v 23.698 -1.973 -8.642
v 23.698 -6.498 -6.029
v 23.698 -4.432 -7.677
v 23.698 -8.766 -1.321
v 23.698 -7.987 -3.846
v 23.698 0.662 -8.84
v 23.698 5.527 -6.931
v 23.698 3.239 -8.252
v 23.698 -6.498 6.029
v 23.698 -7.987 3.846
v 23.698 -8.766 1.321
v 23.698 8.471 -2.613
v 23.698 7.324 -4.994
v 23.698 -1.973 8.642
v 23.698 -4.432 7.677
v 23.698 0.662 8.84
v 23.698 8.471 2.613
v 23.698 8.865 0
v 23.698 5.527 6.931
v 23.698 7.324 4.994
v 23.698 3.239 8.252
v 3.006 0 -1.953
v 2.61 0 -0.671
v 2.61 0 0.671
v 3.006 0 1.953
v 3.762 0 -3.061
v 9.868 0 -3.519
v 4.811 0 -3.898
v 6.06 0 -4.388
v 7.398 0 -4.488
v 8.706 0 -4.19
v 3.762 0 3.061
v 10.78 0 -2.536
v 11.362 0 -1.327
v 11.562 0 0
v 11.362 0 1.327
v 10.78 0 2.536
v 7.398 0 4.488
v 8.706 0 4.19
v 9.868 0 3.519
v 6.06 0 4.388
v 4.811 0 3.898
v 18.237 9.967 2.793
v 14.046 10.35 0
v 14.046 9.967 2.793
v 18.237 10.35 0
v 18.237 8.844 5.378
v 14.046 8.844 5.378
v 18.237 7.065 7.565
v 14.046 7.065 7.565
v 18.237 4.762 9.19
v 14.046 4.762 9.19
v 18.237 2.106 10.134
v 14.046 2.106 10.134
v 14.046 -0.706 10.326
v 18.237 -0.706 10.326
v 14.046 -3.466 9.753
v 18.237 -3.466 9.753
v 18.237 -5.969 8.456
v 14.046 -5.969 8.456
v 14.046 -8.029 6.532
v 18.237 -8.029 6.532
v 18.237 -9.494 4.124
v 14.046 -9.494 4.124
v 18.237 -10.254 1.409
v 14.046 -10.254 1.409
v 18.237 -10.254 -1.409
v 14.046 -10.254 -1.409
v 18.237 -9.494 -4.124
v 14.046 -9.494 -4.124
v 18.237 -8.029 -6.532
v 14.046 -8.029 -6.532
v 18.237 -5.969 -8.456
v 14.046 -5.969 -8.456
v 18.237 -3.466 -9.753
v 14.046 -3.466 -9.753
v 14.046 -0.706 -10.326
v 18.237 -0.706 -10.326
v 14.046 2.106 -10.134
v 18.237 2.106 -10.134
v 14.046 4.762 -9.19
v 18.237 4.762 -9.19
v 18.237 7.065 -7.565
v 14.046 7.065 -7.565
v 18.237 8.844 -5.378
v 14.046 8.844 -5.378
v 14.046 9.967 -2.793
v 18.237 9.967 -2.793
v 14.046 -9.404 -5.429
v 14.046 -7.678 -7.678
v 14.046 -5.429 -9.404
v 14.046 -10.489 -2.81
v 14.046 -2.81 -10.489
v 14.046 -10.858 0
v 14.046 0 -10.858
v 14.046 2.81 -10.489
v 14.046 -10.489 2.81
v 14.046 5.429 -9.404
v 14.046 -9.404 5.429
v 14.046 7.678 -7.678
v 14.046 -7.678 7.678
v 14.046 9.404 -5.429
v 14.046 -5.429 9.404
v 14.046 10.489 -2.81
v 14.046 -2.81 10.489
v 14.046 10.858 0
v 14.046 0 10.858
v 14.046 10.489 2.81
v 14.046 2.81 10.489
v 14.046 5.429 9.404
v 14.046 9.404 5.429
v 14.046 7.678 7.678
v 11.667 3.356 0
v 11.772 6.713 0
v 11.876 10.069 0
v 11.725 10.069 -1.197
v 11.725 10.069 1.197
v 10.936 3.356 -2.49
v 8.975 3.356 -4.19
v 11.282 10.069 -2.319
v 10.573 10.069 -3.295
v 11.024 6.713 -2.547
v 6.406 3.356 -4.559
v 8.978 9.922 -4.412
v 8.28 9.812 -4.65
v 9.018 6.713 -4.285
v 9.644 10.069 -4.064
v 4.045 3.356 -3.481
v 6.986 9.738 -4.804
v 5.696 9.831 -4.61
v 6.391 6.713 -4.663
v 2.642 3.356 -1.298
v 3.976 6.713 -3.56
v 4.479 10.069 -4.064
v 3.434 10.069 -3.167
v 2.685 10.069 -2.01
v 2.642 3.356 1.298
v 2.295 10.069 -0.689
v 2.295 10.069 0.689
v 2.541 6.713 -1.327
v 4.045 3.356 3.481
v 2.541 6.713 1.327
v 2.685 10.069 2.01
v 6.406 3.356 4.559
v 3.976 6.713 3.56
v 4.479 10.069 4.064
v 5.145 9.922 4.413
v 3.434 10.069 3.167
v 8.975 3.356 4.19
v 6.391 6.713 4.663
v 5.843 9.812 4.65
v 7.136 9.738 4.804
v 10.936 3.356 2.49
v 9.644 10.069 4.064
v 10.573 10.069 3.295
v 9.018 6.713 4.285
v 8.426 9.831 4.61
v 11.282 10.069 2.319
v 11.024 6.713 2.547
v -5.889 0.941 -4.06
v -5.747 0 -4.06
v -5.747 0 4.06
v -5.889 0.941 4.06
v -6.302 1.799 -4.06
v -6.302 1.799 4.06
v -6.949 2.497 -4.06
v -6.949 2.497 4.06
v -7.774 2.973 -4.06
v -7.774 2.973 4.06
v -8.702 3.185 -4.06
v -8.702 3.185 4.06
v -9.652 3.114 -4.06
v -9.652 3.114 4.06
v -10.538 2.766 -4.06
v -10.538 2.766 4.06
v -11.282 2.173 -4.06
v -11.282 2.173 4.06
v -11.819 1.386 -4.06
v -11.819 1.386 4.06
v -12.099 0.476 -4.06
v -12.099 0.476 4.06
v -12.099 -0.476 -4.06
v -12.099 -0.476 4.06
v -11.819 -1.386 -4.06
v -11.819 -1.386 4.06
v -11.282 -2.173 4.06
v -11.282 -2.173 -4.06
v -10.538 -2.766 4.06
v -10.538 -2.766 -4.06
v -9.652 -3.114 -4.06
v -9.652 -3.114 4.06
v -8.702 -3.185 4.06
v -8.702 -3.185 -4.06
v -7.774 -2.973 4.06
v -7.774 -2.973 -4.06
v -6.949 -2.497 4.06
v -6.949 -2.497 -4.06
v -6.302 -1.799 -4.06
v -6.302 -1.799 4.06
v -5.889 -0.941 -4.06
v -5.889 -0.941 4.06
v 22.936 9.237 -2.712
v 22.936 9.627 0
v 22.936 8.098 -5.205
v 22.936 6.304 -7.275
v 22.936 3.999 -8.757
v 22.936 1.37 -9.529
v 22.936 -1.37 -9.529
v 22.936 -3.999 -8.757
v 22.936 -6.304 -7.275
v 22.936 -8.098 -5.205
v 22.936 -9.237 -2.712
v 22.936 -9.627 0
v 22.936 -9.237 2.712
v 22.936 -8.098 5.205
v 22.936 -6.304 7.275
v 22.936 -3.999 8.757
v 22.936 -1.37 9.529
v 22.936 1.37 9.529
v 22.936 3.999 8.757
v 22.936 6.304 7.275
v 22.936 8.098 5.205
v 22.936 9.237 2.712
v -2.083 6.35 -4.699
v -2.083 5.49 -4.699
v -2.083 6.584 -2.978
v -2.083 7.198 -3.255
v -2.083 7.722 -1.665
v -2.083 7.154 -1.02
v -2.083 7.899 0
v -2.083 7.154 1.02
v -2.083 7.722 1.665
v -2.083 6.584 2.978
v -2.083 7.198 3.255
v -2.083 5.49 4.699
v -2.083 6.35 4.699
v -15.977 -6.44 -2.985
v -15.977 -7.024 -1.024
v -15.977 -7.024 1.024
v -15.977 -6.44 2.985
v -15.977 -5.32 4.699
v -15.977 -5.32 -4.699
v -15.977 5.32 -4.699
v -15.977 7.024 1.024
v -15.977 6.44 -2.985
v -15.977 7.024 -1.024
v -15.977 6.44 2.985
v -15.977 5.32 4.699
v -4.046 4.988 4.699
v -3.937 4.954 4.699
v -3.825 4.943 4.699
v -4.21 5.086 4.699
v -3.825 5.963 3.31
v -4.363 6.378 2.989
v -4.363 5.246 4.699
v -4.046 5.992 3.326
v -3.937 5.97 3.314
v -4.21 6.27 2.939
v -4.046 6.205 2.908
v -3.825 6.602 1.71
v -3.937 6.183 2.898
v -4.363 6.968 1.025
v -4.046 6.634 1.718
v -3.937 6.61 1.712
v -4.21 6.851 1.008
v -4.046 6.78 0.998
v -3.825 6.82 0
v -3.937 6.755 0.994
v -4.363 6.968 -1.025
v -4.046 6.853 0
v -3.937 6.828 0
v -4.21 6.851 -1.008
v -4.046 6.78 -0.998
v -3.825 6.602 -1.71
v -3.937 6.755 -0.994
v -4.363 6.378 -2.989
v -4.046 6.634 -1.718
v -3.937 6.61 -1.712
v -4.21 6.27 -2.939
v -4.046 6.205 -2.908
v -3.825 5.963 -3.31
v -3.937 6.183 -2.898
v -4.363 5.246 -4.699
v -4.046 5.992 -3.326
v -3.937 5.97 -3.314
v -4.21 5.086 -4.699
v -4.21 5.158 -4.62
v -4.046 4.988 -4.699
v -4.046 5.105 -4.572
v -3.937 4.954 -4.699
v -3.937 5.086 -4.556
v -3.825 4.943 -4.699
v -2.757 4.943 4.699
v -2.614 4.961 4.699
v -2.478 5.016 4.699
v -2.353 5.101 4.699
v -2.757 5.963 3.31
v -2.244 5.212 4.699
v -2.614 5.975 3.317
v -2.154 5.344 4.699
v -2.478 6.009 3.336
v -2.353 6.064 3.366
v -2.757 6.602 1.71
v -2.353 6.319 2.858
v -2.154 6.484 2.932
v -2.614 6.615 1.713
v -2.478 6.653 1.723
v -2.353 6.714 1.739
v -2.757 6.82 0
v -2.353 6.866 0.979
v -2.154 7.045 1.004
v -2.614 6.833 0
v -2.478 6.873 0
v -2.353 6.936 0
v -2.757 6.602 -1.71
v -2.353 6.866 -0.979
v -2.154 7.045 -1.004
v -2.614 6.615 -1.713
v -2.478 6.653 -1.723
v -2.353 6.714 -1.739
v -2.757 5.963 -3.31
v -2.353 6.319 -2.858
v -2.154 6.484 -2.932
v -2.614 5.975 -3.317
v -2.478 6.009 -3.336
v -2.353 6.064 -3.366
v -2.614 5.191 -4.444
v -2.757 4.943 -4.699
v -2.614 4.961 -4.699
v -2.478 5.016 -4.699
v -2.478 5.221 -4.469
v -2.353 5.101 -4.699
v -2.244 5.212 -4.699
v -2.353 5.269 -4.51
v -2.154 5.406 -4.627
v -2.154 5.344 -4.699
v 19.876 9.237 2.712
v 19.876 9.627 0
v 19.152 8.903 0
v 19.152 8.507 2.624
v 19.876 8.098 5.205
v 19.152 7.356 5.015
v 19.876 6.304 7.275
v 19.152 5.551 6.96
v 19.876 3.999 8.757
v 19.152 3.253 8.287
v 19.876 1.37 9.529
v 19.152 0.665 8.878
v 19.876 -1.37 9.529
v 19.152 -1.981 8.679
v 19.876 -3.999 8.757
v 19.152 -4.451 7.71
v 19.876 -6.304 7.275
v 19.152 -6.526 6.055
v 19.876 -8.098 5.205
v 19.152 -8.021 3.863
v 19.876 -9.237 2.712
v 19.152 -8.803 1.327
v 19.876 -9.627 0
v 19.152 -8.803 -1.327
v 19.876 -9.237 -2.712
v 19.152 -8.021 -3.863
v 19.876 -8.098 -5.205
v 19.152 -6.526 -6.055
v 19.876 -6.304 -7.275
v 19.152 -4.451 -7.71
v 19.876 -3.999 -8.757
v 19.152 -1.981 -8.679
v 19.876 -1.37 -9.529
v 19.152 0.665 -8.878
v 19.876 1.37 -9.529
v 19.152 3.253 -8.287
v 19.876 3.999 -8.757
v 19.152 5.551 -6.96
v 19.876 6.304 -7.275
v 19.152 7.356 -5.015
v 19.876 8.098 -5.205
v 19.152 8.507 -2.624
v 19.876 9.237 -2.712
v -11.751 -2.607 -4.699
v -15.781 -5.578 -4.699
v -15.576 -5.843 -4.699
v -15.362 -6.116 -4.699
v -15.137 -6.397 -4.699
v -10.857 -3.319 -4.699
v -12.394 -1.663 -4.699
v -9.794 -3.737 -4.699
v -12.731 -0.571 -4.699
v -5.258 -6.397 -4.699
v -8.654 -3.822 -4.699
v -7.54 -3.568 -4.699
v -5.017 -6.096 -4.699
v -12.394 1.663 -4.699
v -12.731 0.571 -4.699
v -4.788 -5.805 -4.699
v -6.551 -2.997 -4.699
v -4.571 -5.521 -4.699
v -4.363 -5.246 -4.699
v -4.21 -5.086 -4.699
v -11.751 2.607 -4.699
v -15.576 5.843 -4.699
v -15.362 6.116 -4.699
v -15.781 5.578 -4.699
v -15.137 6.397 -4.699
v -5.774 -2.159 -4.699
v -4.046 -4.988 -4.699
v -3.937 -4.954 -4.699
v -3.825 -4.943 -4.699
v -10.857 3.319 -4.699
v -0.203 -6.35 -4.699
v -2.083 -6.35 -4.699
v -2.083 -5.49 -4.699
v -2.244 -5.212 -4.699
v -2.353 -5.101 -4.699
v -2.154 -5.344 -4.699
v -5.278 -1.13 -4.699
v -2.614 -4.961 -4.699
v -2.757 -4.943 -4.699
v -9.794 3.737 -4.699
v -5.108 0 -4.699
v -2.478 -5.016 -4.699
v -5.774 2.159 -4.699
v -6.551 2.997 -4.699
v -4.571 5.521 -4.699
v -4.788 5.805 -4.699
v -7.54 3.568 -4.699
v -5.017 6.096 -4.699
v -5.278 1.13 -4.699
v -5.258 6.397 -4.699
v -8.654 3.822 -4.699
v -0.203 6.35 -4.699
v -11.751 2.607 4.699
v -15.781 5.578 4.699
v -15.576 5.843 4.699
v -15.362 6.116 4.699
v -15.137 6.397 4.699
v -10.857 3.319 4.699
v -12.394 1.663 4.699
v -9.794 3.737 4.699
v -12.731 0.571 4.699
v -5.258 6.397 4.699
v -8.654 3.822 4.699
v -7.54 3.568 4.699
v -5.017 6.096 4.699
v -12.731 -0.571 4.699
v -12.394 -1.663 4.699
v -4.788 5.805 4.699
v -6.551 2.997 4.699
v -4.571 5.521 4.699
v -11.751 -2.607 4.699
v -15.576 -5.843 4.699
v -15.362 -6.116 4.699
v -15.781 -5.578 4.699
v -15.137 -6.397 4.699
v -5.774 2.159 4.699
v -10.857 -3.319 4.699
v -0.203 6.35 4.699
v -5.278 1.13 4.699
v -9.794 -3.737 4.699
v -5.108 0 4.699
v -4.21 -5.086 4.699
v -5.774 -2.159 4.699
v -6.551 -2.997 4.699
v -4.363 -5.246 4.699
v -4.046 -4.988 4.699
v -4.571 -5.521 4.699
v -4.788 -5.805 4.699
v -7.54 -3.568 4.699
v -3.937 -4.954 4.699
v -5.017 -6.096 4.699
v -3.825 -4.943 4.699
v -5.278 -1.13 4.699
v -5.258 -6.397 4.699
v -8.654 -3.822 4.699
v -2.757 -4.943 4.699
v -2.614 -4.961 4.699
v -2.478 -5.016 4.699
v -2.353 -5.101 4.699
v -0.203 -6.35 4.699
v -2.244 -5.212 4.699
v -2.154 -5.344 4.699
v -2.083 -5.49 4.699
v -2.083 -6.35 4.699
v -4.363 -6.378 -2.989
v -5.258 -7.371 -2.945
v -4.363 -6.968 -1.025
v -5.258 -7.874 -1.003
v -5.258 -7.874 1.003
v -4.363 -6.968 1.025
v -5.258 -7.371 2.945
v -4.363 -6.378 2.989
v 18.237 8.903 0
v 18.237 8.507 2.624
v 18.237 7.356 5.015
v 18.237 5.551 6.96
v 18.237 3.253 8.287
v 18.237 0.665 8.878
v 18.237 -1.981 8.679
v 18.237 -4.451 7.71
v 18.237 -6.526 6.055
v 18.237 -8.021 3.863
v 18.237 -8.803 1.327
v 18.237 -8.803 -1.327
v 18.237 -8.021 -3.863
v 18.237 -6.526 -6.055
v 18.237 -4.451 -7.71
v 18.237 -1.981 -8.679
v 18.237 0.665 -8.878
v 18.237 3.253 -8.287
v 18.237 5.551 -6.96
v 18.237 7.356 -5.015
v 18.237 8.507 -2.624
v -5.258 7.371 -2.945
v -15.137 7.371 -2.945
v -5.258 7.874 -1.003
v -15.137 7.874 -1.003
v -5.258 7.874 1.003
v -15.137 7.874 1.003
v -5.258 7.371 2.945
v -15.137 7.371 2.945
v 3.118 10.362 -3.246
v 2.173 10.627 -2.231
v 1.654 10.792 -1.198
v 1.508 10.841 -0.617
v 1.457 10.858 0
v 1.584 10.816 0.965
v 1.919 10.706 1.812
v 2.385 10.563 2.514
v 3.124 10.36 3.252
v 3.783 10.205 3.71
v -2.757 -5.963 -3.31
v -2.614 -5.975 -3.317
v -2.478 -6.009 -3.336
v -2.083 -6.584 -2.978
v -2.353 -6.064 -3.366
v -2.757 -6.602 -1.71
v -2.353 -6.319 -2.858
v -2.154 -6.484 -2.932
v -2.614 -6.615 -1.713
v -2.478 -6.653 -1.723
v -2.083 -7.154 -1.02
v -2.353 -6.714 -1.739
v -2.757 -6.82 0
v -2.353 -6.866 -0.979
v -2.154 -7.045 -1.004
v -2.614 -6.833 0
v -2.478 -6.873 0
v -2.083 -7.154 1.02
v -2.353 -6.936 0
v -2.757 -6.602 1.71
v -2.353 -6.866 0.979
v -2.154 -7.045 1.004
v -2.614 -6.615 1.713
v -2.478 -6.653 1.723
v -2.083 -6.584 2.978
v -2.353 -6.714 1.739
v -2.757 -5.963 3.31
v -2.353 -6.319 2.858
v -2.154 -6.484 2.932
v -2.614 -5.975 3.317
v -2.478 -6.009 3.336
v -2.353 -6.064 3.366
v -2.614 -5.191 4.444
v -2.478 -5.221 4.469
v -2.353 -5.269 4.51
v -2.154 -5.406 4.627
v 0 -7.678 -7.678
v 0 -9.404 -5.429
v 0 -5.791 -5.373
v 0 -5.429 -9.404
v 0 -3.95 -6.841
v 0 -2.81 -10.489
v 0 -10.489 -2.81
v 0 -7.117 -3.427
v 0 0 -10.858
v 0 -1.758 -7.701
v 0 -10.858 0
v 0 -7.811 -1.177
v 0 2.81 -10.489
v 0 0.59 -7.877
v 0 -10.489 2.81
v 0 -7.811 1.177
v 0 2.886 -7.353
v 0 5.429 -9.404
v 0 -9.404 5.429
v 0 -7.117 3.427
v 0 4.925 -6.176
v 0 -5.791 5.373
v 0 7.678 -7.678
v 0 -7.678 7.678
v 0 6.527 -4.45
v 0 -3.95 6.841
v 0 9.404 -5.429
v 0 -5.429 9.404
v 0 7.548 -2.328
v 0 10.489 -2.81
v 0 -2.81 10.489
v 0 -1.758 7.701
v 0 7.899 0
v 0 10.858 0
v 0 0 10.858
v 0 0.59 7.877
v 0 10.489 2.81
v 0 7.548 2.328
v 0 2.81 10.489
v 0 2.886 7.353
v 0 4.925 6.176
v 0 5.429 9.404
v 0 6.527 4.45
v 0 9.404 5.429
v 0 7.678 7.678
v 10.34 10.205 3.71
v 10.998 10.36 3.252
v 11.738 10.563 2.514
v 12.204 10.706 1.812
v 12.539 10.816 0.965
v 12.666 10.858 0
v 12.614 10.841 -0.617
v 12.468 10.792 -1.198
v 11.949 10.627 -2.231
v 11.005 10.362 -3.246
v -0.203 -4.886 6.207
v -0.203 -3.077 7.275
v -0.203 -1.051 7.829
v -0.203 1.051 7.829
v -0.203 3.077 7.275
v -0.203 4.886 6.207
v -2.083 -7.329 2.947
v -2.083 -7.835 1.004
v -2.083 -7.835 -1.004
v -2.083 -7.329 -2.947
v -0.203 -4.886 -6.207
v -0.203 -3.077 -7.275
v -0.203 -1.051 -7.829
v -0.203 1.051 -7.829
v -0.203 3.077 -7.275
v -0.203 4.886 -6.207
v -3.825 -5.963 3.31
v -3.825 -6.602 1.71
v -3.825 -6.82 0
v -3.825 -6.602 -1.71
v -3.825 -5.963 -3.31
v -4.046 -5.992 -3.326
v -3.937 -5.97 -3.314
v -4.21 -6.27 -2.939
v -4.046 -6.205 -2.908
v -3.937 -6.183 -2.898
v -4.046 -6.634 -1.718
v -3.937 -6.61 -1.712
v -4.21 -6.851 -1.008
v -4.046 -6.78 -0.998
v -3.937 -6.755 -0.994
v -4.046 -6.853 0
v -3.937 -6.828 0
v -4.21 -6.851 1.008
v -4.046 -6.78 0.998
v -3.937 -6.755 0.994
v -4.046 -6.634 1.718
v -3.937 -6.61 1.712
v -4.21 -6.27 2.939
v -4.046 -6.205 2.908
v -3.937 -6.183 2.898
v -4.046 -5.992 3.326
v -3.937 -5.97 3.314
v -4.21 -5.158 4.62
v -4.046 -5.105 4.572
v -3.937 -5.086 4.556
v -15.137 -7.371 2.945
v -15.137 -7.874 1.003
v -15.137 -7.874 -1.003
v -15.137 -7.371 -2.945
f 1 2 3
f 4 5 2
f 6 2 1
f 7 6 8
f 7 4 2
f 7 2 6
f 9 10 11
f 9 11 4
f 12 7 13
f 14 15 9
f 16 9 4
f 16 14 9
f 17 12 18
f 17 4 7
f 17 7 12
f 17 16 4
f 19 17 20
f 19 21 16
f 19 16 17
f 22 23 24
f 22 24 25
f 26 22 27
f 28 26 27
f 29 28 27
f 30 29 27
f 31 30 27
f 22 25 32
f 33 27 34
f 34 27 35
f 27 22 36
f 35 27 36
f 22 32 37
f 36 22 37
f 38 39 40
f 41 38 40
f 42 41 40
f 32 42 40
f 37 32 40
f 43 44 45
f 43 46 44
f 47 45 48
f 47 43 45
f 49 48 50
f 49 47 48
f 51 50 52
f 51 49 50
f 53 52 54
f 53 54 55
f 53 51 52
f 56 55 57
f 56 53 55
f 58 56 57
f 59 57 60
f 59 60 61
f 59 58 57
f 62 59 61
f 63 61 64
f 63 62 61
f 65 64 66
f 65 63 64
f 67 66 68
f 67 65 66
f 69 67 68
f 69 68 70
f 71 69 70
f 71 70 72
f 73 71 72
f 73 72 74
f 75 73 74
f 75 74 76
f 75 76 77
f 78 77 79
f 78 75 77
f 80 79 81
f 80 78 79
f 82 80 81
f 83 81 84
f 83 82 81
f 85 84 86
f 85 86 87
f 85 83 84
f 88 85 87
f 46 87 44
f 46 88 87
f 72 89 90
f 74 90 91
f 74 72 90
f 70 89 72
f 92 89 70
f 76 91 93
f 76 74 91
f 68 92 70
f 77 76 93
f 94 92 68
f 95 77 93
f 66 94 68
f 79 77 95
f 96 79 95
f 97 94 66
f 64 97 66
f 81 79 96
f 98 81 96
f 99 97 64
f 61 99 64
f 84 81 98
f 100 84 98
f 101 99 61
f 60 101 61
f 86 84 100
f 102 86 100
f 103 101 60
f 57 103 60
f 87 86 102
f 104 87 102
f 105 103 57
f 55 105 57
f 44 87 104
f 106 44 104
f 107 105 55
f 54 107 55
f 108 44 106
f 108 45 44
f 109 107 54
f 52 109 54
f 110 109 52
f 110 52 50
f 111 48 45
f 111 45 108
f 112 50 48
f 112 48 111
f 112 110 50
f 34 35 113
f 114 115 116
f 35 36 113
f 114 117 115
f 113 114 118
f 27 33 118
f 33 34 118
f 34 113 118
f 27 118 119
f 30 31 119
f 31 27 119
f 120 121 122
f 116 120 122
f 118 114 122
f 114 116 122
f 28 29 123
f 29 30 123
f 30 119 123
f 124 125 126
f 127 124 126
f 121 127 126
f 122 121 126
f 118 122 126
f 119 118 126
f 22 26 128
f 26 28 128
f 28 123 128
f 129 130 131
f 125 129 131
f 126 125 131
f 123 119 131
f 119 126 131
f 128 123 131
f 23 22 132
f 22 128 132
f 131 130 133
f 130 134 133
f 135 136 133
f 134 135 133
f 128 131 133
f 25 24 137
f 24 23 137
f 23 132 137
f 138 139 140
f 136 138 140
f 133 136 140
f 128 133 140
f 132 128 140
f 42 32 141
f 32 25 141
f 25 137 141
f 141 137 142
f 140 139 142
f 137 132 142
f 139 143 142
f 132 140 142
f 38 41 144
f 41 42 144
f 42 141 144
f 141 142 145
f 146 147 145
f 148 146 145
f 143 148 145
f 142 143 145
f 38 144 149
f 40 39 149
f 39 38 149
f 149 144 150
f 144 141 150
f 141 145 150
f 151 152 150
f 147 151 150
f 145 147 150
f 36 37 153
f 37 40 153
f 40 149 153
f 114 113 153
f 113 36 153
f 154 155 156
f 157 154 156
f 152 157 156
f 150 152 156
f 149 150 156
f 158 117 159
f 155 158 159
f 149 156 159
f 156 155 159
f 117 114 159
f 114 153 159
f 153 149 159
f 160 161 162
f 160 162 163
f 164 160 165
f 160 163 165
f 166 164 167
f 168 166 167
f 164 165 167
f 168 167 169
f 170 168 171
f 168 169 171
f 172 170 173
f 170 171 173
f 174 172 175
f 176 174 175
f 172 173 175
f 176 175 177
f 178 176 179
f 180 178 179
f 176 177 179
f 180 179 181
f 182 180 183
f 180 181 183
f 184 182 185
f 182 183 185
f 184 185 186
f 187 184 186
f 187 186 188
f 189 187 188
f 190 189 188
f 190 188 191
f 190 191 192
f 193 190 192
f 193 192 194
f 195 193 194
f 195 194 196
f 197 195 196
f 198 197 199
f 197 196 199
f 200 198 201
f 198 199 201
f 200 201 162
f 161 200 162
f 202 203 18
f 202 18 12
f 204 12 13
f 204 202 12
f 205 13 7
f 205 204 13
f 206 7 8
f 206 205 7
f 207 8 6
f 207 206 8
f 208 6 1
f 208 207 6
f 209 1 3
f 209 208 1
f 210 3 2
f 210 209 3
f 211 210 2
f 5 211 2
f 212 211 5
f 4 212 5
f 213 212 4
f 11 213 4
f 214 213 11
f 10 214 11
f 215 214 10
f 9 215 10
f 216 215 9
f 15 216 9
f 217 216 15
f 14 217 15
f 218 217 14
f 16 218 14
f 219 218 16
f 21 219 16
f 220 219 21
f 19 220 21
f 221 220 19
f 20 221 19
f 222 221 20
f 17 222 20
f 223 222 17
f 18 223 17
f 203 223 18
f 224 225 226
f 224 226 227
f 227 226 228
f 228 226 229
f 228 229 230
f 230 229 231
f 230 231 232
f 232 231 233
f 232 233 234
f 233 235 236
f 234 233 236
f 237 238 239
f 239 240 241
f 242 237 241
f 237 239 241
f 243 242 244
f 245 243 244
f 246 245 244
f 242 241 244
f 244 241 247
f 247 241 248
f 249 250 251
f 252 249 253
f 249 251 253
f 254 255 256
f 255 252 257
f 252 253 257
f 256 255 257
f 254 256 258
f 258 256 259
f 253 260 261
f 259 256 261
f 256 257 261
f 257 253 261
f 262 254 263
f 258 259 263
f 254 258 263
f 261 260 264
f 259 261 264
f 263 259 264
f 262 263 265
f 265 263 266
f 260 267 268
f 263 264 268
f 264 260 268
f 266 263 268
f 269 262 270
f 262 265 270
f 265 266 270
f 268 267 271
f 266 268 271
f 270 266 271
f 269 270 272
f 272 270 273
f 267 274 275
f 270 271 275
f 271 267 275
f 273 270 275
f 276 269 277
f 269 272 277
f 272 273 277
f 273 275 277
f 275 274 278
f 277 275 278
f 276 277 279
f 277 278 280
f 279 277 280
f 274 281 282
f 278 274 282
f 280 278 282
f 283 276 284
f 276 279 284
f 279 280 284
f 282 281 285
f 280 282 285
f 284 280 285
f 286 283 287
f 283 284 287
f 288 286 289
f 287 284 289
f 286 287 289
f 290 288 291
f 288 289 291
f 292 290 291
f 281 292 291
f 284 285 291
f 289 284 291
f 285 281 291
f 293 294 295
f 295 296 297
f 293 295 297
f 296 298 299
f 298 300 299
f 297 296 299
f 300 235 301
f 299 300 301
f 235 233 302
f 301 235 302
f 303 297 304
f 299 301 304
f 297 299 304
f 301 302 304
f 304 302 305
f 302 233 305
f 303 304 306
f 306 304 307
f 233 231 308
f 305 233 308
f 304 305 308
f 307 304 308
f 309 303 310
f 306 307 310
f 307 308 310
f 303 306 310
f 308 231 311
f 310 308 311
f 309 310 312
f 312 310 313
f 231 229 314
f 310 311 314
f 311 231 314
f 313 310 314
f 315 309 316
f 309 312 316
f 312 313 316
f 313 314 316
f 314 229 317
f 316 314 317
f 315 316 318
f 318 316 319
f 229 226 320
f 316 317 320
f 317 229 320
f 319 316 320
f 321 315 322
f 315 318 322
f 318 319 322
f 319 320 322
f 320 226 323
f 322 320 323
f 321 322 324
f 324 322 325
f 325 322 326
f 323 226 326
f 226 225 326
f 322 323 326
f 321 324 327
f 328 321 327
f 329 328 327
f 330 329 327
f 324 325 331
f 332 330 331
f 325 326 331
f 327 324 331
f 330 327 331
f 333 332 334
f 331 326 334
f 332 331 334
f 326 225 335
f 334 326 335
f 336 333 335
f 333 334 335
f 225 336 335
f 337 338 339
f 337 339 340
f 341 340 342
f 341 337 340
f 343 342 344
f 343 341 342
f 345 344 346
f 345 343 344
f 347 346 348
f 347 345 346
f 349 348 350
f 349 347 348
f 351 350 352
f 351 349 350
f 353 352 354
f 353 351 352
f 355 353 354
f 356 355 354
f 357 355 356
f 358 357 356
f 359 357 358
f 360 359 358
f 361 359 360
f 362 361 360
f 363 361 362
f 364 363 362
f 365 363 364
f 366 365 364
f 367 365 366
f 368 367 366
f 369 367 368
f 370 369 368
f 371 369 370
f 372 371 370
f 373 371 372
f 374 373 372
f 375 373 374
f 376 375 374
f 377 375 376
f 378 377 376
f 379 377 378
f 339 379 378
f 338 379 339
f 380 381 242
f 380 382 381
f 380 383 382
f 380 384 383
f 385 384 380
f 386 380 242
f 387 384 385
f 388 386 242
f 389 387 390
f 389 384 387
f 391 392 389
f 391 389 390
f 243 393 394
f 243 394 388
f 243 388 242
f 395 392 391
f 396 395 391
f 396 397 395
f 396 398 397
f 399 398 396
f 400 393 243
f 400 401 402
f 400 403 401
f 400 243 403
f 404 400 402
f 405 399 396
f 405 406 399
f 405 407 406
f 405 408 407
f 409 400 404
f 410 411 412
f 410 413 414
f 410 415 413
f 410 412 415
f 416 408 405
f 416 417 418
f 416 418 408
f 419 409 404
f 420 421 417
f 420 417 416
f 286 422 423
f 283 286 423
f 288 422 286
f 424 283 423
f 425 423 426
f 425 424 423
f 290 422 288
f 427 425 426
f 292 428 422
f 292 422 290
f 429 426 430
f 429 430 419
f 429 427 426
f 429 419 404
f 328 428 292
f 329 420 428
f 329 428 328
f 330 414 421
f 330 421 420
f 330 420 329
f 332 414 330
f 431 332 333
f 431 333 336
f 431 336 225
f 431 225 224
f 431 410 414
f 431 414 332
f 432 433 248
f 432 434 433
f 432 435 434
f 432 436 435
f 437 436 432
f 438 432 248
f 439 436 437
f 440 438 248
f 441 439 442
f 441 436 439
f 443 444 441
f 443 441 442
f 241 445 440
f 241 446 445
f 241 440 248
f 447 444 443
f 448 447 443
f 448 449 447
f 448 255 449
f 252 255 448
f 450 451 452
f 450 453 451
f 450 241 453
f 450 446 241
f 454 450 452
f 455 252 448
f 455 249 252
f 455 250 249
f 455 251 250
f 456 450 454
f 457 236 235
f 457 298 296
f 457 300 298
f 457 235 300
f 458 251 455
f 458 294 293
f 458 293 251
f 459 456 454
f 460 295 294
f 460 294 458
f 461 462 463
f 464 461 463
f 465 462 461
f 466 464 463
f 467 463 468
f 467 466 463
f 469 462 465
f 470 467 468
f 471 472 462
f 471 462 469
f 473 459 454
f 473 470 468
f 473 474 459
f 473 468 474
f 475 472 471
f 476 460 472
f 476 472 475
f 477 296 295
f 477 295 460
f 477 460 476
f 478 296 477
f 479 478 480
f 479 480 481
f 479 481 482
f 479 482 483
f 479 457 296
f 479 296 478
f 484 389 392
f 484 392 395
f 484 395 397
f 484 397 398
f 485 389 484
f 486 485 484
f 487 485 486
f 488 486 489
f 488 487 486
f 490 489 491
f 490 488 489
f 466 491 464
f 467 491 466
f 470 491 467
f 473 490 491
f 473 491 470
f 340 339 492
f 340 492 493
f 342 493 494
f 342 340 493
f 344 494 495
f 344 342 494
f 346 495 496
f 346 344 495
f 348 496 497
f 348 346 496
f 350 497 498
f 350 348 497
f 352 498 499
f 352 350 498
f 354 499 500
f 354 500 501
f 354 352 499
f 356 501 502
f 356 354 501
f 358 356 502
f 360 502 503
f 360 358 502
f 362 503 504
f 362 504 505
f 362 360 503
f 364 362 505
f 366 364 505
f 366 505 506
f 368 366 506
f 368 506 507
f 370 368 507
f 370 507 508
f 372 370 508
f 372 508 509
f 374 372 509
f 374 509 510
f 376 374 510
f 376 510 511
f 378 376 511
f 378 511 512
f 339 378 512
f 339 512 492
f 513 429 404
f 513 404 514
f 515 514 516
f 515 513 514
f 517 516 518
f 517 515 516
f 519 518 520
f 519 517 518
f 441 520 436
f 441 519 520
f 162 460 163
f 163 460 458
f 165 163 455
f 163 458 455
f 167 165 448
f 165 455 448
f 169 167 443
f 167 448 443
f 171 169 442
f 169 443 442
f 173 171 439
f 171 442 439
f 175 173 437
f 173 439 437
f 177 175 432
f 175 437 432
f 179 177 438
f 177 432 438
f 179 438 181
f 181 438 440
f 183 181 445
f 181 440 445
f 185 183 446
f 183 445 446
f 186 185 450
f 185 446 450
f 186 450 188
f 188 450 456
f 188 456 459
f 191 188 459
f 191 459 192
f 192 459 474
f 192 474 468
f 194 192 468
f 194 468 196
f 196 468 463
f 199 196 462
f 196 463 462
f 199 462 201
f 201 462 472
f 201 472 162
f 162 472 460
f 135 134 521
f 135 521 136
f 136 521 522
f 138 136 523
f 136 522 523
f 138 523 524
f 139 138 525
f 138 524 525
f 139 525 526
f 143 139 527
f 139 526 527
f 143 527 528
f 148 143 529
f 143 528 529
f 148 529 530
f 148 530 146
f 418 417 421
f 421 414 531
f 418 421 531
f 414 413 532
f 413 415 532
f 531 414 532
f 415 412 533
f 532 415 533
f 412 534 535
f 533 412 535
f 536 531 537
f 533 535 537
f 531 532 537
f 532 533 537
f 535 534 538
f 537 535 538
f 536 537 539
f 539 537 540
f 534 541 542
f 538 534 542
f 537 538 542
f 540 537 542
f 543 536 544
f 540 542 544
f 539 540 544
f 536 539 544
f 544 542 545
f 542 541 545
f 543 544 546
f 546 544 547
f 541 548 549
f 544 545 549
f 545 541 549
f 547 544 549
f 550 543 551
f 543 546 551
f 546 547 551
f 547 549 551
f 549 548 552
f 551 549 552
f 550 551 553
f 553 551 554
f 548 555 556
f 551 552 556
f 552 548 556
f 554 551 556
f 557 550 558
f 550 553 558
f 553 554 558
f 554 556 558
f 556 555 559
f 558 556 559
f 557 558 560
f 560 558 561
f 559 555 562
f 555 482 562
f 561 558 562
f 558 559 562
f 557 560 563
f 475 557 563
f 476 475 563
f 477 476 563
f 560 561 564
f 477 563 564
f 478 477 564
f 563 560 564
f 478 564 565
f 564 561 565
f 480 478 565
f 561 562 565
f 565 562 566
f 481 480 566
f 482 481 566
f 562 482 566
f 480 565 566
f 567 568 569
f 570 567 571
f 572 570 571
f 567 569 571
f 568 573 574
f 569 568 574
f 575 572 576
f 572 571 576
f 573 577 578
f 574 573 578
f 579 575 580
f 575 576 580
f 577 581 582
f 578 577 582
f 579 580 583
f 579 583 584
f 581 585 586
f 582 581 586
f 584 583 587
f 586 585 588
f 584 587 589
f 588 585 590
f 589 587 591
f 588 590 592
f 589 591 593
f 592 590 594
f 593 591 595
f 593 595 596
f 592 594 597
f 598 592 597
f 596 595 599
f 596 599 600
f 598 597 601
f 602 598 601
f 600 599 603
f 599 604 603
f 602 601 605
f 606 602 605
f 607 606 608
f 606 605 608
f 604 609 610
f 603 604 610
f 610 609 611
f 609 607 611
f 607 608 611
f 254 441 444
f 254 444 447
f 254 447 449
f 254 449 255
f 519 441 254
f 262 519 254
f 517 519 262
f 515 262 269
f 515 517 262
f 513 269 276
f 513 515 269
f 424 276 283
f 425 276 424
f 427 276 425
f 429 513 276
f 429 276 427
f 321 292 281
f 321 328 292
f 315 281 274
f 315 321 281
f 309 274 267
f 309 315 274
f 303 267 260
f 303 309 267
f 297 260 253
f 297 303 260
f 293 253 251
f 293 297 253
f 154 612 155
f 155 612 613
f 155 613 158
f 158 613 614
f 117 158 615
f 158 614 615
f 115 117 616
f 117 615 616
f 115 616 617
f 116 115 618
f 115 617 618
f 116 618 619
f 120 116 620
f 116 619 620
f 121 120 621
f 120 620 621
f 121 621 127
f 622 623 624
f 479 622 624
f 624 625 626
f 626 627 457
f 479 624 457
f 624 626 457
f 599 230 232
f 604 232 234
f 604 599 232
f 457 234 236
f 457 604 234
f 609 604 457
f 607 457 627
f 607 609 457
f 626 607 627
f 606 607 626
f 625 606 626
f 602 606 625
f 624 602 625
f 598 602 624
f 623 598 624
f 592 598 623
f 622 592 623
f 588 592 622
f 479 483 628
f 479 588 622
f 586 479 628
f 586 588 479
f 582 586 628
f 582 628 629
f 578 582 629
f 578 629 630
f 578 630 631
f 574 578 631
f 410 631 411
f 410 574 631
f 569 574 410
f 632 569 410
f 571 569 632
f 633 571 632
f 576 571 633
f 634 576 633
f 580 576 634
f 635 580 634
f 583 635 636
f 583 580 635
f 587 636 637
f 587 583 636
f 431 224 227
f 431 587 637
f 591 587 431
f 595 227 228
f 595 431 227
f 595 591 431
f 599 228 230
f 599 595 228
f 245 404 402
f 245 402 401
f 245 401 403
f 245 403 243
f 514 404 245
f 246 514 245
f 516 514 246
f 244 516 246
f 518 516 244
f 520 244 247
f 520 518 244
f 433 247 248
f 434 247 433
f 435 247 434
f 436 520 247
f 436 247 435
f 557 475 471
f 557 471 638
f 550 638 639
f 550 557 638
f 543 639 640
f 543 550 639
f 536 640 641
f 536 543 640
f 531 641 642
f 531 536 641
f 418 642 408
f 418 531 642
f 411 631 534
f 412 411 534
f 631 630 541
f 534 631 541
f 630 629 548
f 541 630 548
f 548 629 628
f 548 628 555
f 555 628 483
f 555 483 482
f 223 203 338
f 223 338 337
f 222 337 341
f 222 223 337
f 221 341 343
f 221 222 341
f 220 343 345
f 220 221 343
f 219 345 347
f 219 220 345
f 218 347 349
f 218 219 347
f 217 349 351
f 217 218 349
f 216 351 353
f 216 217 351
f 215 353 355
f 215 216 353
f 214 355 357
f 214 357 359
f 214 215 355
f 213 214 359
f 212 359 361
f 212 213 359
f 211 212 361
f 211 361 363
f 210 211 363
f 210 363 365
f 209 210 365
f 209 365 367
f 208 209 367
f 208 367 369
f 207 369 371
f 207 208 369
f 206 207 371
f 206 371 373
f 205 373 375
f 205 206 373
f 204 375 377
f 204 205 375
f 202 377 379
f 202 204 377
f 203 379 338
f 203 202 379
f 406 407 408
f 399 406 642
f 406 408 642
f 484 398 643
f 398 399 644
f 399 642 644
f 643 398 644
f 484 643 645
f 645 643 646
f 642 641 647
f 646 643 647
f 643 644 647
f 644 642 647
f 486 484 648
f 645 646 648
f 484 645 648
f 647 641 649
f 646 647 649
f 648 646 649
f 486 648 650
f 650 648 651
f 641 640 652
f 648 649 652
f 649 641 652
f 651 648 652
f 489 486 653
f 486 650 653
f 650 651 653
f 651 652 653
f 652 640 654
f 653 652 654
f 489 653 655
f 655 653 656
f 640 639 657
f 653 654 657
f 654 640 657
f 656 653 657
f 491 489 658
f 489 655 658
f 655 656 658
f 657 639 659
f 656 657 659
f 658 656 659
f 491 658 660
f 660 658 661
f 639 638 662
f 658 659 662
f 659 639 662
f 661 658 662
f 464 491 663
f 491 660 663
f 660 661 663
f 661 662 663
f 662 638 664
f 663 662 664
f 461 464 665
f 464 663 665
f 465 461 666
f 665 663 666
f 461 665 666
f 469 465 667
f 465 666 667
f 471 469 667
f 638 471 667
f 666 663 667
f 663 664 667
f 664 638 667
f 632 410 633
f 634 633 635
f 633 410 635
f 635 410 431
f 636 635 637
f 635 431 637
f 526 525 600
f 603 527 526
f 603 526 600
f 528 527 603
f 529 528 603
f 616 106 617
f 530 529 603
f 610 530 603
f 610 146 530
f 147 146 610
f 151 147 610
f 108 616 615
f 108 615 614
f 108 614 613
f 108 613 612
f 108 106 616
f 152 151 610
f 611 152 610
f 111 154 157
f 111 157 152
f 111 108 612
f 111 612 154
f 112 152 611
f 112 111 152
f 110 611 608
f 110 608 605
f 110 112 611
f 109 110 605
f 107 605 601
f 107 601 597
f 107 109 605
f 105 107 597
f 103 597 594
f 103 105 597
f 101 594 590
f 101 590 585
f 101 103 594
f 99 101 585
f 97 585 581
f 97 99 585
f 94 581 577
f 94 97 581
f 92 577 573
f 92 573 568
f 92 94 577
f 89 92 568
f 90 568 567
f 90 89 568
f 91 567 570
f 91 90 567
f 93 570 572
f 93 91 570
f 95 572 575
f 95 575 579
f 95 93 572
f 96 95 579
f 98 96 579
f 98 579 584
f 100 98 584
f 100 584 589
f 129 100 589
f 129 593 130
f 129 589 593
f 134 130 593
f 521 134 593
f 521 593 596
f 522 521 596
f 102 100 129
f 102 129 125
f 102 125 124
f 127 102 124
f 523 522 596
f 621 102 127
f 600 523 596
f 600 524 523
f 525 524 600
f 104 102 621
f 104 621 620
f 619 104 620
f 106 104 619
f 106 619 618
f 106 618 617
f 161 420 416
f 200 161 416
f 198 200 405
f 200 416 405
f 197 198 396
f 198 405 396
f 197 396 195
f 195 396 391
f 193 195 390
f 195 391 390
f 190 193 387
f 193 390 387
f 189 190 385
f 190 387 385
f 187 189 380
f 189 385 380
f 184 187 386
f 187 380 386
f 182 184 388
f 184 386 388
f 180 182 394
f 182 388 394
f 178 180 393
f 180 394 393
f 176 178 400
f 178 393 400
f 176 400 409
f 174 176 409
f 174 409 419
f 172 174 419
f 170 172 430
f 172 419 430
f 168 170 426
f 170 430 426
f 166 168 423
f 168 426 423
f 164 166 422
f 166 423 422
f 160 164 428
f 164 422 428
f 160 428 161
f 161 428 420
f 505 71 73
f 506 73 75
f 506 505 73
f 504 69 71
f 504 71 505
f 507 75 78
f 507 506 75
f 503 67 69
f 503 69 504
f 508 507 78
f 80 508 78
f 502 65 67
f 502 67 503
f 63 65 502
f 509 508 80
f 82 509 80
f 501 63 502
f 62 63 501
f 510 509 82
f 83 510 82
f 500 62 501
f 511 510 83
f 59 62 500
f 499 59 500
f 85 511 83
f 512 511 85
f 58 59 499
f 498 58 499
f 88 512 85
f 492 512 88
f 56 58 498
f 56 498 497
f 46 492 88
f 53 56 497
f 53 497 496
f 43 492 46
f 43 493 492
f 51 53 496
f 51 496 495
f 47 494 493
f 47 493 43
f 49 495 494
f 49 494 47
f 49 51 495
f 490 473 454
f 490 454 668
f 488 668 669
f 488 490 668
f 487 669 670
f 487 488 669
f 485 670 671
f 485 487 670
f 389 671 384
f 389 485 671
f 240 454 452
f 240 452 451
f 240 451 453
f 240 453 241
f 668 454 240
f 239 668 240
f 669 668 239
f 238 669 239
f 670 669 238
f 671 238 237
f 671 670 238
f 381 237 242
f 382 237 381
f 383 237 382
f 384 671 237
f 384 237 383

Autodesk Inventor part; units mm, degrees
sketch "Sketch_1" plane through (0, 0, 0) normal (0, 0, 1) x (1, 0, 0)
  line L0 (14.0462, 0) -> (0, 0)
  line L1 (0, 0) -> (0, 10.8585)
  line L2 (0, 10.8585) -> (14.0462, 10.8585)
  line L3 (14.0462, 10.8585) -> (14.0462, 0)
  line L4 (14.0462, 0) -> (0, 0)
revolve "Revolution1" add sketch "Sketch_1" angle 360 about axis through (14.0462, 0, 0) along (1, 0, 0)
sketch "Sketch_2" plane through (0, 0, 0) normal (0, 0, 1) x (1, 0, 0)
  line L0 (0, 0) -> (-15.9766, 0)
  line L1 (-15.9766, 0) -> (-15.9766, 7.098)
  line L2 (-15.9766, 7.098) -> (-15.1371, 7.9375)
  line L3 (-15.1371, 7.9375) -> (0, 7.9375)
  line L4 (0, 7.9375) -> (0, 0)
  line L5 (0, 0) -> (-15.9766, 0)
revolve "Revolution2" add sketch "Sketch_2" angle 360 about axis through (0, 0, 0) along (1, 0, 0)
thread "Thread1" size "5/8-18 UNF" class "2A" standard "ANSI Unified Screw Threads" length 9.8793
sketch "Sketch_6" plane through (0, 0, 0) normal (0, 0, 1) x (1, 0, 0)
  line L0 (23.6982, 0) -> (14.0462, 0)
  line L1 (14.0462, 0) -> (14.0462, 10.3505)
  line L2 (14.0462, 10.3505) -> (18.2372, 10.3505)
  line L3 (18.2372, 10.3505) -> (18.2372, 8.9027)
  line L4 (18.2372, 8.9027) -> (19.1516, 8.9027)
  line L5 (19.1516, 8.9027) -> (19.8755, 9.6266)
  line L6 (19.8755, 9.6266) -> (22.9362, 9.6266)
  line L7 (22.9362, 9.6266) -> (23.6982, 8.8646)
  line L8 (23.6982, 8.8646) -> (23.6982, 0)
  line L9 (23.6982, 0) -> (14.0462, 0)
revolve "Revolution3" add sketch "Sketch_6" angle 360 about axis through (23.6982, 0, 0) along (1, 0, 0)
sketch "Sketch_8" plane through (7.0612, 0, 0) normal (0, 0, 1) x (0, -1, 0)
  line L0 (0, 0) -> (-11.7085, 0)
  line L1 (-11.7085, 0) -> (-11.7085, 6.4547)
  line L2 (-11.7085, 6.4547) -> (-10.0692, 4.8153)
  line L3 (-10.0692, 4.8153) -> (0, 4.501)
  line L4 (0, 4.501) -> (0, 0)
  line L5 (0, 0) -> (-11.7085, 0)
revolve "Revolution4" cut sketch "Sketch_8" angle 360 about axis through (7.0612, 0, 0) along (0, -1, 0)
sketch "Sketch_29" plane through (0, 0, 0) normal (0, 0, 1) x (1, 0, 0)
  line L0 (0, 0) -> (-5.2578, 0)
  line L1 (-5.2578, 9.8994) -> (-5.2578, 7.9375)
  line L2 (-5.2578, 7.9375) -> (-4.3634, 7.0431)
  arc A0 (-4.3634, 7.0431) -> (-3.8246, 6.8199) centre (-3.8246, 7.5819) ccw
  line L3 (-3.8246, 6.8199) -> (-2.7567, 6.8199)
  arc A1 (-2.7567, 6.8199) -> (-2.0828, 7.2263) centre (-2.7567, 7.5819) ccw
  line L4 (-2.0828, 7.2263) -> (-2.0828, 7.8994)
  line L5 (-2.0828, 7.8994) -> (0, 7.8994)
  line L6 (0, 7.8994) -> (0, 9.8994)
  line L7 (0, 9.8994) -> (-5.2578, 9.8994)
revolve "Revolution5" cut sketch "Sketch_29" angle 360 about axis through (0, 0, 0) along (1, 0, 0)
sketch "Sketch_38" plane through (-0.2032, 0, 0) normal (1, 0, 0) x (0, 0, -1)
  line L0 (-10.8585, -10.8585) -> (10.8585, -10.8585)
  line L1 (10.8585, -10.8585) -> (10.8585, 10.8585)
  line L2 (10.8585, 10.8585) -> (-10.8585, 10.8585)
  line L3 (-10.8585, 10.8585) -> (-10.8585, -10.8585)
  line L4 (-4.699, -8.7312) -> (4.699, -8.7312)
  line L5 (4.699, -8.7312) -> (4.699, 8.7312)
  line L6 (4.699, 8.7312) -> (-4.699, 8.7312)
  line L7 (-4.699, 8.7312) -> (-4.699, -8.7312)
extrude "Extrusion1" cut sketch "Sketch_38" against normal blind 15.9766
sketch "Sketch_36" plane through (0, 0, 0) normal (0, 1, 0) x (-1, 0, 0)
  line L0 (8.9408, 4.699) -> (8.9408, -4.699)
  line L1 (8.9408, -4.699) -> (5.1079, -4.699)
  line L2 (5.1079, -4.699) -> (5.7467, -4.0602)
  line L3 (5.7467, -4.0602) -> (5.7467, 4.0602)
  line L4 (5.7467, 4.0602) -> (5.1079, 4.699)
  line L5 (5.1079, 4.699) -> (8.9408, 4.699)
  line L6 (8.9408, 4.699) -> (8.9408, -4.699)
revolve "Revolution6" cut sketch "Sketch_36" angle 360 about axis through (-8.9408, 0, 4.699) along (0, 0, 1)
ref_plane "b1_XY" through (0, 7.8994, 0) normal (1, 0, 0) x (0, 0, -1)
ref_plane "b1_YZ" through (0, 7.8994, 0) normal (0, 0, -1) x (0, 1, 0)
ref_plane "b1_ZX" through (0, 7.8994, 0) normal (0, 1, 0) x (1, 0, 0)
ref_plane "b2_XY" through (0, -7.8994, 0) normal (1, 0, 0) x (0, 0, -1)
ref_plane "b2_YZ" through (0, -7.8994, 0) normal (0, 0, -1) x (0, 1, 0)
ref_plane "b2_ZX" through (0, -7.8994, 0) normal (0, 1, 0) x (1, 0, 0)
ref_plane "cl1_XY" through (0, 0, 0) normal (0, 0, 1) x (1, 0, 0)
ref_plane "cl1_YZ" through (0, 0, 0) normal (1, 0, 0) x (0, 1, 0)
ref_plane "cl1_ZX" through (0, 0, 0) normal (0, 1, 0) x (0, 0, 1)
ref_plane "cl2_XY" through (-2.0828, 0, 0) normal (0, 0, 1) x (1, 0, 0)
ref_plane "cl2_YZ" through (-2.0828, 0, 0) normal (1, 0, 0) x (0, 1, 0)
ref_plane "cl2_ZX" through (-2.0828, 0, 0) normal (0, 1, 0) x (0, 0, 1)
ref_plane "ecut1_XY" through (-0.2032, 0, 4.699) normal (1, 0, 0) x (0, 0, -1)
ref_plane "ecut1_YZ" through (-0.2032, 0, 4.699) normal (0, 0, -1) x (0, 1, 0)
ref_plane "ecut1_ZX" through (-0.2032, 0, 4.699) normal (0, 1, 0) x (1, 0, 0)
ref_plane "ecut2_XY" through (-0.2032, 0, -4.699) normal (1, 0, 0) x (0, 0, -1)
ref_plane "ecut2_YZ" through (-0.2032, 0, -4.699) normal (0, 0, -1) x (0, 1, 0)
ref_plane "ecut2_ZX" through (-0.2032, 0, -4.699) normal (0, 1, 0) x (1, 0, 0)
ref_plane "ee_XY" through (7.0612, 10.8585, 0) normal (1, 0, 0) x (0, -1, 0)
ref_plane "ee_YZ" through (7.0612, 10.8585, 0) normal (0, -1, 0) x (0, 0, -1)
ref_plane "ee_ZX" through (7.0612, 10.8585, 0) normal (0, 0, -1) x (1, 0, 0)
ref_plane "od1_XY" through (0, 0, 10.8585) normal (1, 0, 0) x (0, 0, -1)
ref_plane "od1_YZ" through (0, 0, 10.8585) normal (0, 0, -1) x (0, 1, 0)
ref_plane "od1_ZX" through (0, 0, 10.8585) normal (0, 1, 0) x (1, 0, 0)
ref_plane "od2_XY" through (0, 0, -10.8585) normal (1, 0, 0) x (0, 0, -1)
ref_plane "od2_YZ" through (0, 0, -10.8585) normal (0, 0, -1) x (0, 1, 0)
ref_plane "od2_ZX" through (0, 0, -10.8585) normal (0, 1, 0) x (1, 0, 0)
ref_plane "od3_XY" through (0, 10.8585, 0) normal (1, 0, 0) x (0, 0, -1)
ref_plane "od3_YZ" through (0, 10.8585, 0) normal (0, 0, -1) x (0, 1, 0)
ref_plane "od3_ZX" through (0, 10.8585, 0) normal (0, 1, 0) x (1, 0, 0)
ref_plane "od4_XY" through (0, -10.8585, 0) normal (1, 0, 0) x (0, 0, -1)
ref_plane "od4_YZ" through (0, -10.8585, 0) normal (0, 0, -1) x (0, 1, 0)
ref_plane "od4_ZX" through (0, -10.8585, 0) normal (0, 1, 0) x (1, 0, 0)
ref_plane "to_body_XY" through (18.2372, 0, 0) normal (1, 0, 0) x (0, 0, -1)
ref_plane "to_body_YZ" through (18.2372, 0, 0) normal (0, 0, -1) x (0, 1, 0)
ref_plane "to_body_ZX" through (18.2372, 0, 0) normal (0, 1, 0) x (1, 0, 0)
ref_plane "to_dummy_XY" through (0, 0, 0) normal (1, 0, 0) x (0, 0, -1)
ref_plane "to_dummy_YZ" through (0, 0, 0) normal (0, 0, -1) x (0, 1, 0)
ref_plane "to_dummy_ZX" through (0, 0, 0) normal (0, 1, 0) x (1, 0, 0)
ref_plane "to_nut_XY" through (-15.9766, 0, 0) normal (1, 0, 0) x (0, 0, -1)
ref_plane "to_nut_YZ" through (-15.9766, 0, 0) normal (0, 0, -1) x (0, 1, 0)
ref_plane "to_nut_ZX" through (-15.9766, 0, 0) normal (0, 1, 0) x (1, 0, 0)
ref_plane "to_pin_XY" through (-8.9408, 0, 0) normal (0, 0, 1) x (1, 0, 0)
ref_plane "to_pin_YZ" through (-8.9408, 0, 0) normal (1, 0, 0) x (0, 1, 0)
ref_plane "to_pin_ZX" through (-8.9408, 0, 0) normal (0, 1, 0) x (0, 0, 1)
ref_plane "to_stroke_adjuster_XY" through (23.6982, 0, 0) normal (1, 0, 0) x (0, 0, -1)
ref_plane "to_stroke_adjuster_YZ" through (23.6982, 0, 0) normal (0, 0, -1) x (0, 1, 0)
ref_plane "to_stroke_adjuster_ZX" through (23.6982, 0, 0) normal (0, 1, 0) x (1, 0, 0)
ref_plane "z1_XY" through (-8.9408, 3.194, 0) normal (0, 0, 1) x (1, 0, 0)
ref_plane "z1_YZ" through (-8.9408, 3.194, 0) normal (1, 0, 0) x (0, 1, 0)
ref_plane "z1_ZX" through (-8.9408, 3.194, 0) normal (0, 1, 0) x (0, 0, 1)
ref_plane "z2_XY" through (-8.9408, -3.194, 0) normal (0, 0, 1) x (1, 0, 0)
ref_plane "z2_YZ" through (-8.9408, -3.194, 0) normal (1, 0, 0) x (0, 1, 0)
ref_plane "z2_ZX" through (-8.9408, -3.194, 0) normal (0, 1, 0) x (0, 0, 1)
properties part number "0.75DXP-C_SRS10"
